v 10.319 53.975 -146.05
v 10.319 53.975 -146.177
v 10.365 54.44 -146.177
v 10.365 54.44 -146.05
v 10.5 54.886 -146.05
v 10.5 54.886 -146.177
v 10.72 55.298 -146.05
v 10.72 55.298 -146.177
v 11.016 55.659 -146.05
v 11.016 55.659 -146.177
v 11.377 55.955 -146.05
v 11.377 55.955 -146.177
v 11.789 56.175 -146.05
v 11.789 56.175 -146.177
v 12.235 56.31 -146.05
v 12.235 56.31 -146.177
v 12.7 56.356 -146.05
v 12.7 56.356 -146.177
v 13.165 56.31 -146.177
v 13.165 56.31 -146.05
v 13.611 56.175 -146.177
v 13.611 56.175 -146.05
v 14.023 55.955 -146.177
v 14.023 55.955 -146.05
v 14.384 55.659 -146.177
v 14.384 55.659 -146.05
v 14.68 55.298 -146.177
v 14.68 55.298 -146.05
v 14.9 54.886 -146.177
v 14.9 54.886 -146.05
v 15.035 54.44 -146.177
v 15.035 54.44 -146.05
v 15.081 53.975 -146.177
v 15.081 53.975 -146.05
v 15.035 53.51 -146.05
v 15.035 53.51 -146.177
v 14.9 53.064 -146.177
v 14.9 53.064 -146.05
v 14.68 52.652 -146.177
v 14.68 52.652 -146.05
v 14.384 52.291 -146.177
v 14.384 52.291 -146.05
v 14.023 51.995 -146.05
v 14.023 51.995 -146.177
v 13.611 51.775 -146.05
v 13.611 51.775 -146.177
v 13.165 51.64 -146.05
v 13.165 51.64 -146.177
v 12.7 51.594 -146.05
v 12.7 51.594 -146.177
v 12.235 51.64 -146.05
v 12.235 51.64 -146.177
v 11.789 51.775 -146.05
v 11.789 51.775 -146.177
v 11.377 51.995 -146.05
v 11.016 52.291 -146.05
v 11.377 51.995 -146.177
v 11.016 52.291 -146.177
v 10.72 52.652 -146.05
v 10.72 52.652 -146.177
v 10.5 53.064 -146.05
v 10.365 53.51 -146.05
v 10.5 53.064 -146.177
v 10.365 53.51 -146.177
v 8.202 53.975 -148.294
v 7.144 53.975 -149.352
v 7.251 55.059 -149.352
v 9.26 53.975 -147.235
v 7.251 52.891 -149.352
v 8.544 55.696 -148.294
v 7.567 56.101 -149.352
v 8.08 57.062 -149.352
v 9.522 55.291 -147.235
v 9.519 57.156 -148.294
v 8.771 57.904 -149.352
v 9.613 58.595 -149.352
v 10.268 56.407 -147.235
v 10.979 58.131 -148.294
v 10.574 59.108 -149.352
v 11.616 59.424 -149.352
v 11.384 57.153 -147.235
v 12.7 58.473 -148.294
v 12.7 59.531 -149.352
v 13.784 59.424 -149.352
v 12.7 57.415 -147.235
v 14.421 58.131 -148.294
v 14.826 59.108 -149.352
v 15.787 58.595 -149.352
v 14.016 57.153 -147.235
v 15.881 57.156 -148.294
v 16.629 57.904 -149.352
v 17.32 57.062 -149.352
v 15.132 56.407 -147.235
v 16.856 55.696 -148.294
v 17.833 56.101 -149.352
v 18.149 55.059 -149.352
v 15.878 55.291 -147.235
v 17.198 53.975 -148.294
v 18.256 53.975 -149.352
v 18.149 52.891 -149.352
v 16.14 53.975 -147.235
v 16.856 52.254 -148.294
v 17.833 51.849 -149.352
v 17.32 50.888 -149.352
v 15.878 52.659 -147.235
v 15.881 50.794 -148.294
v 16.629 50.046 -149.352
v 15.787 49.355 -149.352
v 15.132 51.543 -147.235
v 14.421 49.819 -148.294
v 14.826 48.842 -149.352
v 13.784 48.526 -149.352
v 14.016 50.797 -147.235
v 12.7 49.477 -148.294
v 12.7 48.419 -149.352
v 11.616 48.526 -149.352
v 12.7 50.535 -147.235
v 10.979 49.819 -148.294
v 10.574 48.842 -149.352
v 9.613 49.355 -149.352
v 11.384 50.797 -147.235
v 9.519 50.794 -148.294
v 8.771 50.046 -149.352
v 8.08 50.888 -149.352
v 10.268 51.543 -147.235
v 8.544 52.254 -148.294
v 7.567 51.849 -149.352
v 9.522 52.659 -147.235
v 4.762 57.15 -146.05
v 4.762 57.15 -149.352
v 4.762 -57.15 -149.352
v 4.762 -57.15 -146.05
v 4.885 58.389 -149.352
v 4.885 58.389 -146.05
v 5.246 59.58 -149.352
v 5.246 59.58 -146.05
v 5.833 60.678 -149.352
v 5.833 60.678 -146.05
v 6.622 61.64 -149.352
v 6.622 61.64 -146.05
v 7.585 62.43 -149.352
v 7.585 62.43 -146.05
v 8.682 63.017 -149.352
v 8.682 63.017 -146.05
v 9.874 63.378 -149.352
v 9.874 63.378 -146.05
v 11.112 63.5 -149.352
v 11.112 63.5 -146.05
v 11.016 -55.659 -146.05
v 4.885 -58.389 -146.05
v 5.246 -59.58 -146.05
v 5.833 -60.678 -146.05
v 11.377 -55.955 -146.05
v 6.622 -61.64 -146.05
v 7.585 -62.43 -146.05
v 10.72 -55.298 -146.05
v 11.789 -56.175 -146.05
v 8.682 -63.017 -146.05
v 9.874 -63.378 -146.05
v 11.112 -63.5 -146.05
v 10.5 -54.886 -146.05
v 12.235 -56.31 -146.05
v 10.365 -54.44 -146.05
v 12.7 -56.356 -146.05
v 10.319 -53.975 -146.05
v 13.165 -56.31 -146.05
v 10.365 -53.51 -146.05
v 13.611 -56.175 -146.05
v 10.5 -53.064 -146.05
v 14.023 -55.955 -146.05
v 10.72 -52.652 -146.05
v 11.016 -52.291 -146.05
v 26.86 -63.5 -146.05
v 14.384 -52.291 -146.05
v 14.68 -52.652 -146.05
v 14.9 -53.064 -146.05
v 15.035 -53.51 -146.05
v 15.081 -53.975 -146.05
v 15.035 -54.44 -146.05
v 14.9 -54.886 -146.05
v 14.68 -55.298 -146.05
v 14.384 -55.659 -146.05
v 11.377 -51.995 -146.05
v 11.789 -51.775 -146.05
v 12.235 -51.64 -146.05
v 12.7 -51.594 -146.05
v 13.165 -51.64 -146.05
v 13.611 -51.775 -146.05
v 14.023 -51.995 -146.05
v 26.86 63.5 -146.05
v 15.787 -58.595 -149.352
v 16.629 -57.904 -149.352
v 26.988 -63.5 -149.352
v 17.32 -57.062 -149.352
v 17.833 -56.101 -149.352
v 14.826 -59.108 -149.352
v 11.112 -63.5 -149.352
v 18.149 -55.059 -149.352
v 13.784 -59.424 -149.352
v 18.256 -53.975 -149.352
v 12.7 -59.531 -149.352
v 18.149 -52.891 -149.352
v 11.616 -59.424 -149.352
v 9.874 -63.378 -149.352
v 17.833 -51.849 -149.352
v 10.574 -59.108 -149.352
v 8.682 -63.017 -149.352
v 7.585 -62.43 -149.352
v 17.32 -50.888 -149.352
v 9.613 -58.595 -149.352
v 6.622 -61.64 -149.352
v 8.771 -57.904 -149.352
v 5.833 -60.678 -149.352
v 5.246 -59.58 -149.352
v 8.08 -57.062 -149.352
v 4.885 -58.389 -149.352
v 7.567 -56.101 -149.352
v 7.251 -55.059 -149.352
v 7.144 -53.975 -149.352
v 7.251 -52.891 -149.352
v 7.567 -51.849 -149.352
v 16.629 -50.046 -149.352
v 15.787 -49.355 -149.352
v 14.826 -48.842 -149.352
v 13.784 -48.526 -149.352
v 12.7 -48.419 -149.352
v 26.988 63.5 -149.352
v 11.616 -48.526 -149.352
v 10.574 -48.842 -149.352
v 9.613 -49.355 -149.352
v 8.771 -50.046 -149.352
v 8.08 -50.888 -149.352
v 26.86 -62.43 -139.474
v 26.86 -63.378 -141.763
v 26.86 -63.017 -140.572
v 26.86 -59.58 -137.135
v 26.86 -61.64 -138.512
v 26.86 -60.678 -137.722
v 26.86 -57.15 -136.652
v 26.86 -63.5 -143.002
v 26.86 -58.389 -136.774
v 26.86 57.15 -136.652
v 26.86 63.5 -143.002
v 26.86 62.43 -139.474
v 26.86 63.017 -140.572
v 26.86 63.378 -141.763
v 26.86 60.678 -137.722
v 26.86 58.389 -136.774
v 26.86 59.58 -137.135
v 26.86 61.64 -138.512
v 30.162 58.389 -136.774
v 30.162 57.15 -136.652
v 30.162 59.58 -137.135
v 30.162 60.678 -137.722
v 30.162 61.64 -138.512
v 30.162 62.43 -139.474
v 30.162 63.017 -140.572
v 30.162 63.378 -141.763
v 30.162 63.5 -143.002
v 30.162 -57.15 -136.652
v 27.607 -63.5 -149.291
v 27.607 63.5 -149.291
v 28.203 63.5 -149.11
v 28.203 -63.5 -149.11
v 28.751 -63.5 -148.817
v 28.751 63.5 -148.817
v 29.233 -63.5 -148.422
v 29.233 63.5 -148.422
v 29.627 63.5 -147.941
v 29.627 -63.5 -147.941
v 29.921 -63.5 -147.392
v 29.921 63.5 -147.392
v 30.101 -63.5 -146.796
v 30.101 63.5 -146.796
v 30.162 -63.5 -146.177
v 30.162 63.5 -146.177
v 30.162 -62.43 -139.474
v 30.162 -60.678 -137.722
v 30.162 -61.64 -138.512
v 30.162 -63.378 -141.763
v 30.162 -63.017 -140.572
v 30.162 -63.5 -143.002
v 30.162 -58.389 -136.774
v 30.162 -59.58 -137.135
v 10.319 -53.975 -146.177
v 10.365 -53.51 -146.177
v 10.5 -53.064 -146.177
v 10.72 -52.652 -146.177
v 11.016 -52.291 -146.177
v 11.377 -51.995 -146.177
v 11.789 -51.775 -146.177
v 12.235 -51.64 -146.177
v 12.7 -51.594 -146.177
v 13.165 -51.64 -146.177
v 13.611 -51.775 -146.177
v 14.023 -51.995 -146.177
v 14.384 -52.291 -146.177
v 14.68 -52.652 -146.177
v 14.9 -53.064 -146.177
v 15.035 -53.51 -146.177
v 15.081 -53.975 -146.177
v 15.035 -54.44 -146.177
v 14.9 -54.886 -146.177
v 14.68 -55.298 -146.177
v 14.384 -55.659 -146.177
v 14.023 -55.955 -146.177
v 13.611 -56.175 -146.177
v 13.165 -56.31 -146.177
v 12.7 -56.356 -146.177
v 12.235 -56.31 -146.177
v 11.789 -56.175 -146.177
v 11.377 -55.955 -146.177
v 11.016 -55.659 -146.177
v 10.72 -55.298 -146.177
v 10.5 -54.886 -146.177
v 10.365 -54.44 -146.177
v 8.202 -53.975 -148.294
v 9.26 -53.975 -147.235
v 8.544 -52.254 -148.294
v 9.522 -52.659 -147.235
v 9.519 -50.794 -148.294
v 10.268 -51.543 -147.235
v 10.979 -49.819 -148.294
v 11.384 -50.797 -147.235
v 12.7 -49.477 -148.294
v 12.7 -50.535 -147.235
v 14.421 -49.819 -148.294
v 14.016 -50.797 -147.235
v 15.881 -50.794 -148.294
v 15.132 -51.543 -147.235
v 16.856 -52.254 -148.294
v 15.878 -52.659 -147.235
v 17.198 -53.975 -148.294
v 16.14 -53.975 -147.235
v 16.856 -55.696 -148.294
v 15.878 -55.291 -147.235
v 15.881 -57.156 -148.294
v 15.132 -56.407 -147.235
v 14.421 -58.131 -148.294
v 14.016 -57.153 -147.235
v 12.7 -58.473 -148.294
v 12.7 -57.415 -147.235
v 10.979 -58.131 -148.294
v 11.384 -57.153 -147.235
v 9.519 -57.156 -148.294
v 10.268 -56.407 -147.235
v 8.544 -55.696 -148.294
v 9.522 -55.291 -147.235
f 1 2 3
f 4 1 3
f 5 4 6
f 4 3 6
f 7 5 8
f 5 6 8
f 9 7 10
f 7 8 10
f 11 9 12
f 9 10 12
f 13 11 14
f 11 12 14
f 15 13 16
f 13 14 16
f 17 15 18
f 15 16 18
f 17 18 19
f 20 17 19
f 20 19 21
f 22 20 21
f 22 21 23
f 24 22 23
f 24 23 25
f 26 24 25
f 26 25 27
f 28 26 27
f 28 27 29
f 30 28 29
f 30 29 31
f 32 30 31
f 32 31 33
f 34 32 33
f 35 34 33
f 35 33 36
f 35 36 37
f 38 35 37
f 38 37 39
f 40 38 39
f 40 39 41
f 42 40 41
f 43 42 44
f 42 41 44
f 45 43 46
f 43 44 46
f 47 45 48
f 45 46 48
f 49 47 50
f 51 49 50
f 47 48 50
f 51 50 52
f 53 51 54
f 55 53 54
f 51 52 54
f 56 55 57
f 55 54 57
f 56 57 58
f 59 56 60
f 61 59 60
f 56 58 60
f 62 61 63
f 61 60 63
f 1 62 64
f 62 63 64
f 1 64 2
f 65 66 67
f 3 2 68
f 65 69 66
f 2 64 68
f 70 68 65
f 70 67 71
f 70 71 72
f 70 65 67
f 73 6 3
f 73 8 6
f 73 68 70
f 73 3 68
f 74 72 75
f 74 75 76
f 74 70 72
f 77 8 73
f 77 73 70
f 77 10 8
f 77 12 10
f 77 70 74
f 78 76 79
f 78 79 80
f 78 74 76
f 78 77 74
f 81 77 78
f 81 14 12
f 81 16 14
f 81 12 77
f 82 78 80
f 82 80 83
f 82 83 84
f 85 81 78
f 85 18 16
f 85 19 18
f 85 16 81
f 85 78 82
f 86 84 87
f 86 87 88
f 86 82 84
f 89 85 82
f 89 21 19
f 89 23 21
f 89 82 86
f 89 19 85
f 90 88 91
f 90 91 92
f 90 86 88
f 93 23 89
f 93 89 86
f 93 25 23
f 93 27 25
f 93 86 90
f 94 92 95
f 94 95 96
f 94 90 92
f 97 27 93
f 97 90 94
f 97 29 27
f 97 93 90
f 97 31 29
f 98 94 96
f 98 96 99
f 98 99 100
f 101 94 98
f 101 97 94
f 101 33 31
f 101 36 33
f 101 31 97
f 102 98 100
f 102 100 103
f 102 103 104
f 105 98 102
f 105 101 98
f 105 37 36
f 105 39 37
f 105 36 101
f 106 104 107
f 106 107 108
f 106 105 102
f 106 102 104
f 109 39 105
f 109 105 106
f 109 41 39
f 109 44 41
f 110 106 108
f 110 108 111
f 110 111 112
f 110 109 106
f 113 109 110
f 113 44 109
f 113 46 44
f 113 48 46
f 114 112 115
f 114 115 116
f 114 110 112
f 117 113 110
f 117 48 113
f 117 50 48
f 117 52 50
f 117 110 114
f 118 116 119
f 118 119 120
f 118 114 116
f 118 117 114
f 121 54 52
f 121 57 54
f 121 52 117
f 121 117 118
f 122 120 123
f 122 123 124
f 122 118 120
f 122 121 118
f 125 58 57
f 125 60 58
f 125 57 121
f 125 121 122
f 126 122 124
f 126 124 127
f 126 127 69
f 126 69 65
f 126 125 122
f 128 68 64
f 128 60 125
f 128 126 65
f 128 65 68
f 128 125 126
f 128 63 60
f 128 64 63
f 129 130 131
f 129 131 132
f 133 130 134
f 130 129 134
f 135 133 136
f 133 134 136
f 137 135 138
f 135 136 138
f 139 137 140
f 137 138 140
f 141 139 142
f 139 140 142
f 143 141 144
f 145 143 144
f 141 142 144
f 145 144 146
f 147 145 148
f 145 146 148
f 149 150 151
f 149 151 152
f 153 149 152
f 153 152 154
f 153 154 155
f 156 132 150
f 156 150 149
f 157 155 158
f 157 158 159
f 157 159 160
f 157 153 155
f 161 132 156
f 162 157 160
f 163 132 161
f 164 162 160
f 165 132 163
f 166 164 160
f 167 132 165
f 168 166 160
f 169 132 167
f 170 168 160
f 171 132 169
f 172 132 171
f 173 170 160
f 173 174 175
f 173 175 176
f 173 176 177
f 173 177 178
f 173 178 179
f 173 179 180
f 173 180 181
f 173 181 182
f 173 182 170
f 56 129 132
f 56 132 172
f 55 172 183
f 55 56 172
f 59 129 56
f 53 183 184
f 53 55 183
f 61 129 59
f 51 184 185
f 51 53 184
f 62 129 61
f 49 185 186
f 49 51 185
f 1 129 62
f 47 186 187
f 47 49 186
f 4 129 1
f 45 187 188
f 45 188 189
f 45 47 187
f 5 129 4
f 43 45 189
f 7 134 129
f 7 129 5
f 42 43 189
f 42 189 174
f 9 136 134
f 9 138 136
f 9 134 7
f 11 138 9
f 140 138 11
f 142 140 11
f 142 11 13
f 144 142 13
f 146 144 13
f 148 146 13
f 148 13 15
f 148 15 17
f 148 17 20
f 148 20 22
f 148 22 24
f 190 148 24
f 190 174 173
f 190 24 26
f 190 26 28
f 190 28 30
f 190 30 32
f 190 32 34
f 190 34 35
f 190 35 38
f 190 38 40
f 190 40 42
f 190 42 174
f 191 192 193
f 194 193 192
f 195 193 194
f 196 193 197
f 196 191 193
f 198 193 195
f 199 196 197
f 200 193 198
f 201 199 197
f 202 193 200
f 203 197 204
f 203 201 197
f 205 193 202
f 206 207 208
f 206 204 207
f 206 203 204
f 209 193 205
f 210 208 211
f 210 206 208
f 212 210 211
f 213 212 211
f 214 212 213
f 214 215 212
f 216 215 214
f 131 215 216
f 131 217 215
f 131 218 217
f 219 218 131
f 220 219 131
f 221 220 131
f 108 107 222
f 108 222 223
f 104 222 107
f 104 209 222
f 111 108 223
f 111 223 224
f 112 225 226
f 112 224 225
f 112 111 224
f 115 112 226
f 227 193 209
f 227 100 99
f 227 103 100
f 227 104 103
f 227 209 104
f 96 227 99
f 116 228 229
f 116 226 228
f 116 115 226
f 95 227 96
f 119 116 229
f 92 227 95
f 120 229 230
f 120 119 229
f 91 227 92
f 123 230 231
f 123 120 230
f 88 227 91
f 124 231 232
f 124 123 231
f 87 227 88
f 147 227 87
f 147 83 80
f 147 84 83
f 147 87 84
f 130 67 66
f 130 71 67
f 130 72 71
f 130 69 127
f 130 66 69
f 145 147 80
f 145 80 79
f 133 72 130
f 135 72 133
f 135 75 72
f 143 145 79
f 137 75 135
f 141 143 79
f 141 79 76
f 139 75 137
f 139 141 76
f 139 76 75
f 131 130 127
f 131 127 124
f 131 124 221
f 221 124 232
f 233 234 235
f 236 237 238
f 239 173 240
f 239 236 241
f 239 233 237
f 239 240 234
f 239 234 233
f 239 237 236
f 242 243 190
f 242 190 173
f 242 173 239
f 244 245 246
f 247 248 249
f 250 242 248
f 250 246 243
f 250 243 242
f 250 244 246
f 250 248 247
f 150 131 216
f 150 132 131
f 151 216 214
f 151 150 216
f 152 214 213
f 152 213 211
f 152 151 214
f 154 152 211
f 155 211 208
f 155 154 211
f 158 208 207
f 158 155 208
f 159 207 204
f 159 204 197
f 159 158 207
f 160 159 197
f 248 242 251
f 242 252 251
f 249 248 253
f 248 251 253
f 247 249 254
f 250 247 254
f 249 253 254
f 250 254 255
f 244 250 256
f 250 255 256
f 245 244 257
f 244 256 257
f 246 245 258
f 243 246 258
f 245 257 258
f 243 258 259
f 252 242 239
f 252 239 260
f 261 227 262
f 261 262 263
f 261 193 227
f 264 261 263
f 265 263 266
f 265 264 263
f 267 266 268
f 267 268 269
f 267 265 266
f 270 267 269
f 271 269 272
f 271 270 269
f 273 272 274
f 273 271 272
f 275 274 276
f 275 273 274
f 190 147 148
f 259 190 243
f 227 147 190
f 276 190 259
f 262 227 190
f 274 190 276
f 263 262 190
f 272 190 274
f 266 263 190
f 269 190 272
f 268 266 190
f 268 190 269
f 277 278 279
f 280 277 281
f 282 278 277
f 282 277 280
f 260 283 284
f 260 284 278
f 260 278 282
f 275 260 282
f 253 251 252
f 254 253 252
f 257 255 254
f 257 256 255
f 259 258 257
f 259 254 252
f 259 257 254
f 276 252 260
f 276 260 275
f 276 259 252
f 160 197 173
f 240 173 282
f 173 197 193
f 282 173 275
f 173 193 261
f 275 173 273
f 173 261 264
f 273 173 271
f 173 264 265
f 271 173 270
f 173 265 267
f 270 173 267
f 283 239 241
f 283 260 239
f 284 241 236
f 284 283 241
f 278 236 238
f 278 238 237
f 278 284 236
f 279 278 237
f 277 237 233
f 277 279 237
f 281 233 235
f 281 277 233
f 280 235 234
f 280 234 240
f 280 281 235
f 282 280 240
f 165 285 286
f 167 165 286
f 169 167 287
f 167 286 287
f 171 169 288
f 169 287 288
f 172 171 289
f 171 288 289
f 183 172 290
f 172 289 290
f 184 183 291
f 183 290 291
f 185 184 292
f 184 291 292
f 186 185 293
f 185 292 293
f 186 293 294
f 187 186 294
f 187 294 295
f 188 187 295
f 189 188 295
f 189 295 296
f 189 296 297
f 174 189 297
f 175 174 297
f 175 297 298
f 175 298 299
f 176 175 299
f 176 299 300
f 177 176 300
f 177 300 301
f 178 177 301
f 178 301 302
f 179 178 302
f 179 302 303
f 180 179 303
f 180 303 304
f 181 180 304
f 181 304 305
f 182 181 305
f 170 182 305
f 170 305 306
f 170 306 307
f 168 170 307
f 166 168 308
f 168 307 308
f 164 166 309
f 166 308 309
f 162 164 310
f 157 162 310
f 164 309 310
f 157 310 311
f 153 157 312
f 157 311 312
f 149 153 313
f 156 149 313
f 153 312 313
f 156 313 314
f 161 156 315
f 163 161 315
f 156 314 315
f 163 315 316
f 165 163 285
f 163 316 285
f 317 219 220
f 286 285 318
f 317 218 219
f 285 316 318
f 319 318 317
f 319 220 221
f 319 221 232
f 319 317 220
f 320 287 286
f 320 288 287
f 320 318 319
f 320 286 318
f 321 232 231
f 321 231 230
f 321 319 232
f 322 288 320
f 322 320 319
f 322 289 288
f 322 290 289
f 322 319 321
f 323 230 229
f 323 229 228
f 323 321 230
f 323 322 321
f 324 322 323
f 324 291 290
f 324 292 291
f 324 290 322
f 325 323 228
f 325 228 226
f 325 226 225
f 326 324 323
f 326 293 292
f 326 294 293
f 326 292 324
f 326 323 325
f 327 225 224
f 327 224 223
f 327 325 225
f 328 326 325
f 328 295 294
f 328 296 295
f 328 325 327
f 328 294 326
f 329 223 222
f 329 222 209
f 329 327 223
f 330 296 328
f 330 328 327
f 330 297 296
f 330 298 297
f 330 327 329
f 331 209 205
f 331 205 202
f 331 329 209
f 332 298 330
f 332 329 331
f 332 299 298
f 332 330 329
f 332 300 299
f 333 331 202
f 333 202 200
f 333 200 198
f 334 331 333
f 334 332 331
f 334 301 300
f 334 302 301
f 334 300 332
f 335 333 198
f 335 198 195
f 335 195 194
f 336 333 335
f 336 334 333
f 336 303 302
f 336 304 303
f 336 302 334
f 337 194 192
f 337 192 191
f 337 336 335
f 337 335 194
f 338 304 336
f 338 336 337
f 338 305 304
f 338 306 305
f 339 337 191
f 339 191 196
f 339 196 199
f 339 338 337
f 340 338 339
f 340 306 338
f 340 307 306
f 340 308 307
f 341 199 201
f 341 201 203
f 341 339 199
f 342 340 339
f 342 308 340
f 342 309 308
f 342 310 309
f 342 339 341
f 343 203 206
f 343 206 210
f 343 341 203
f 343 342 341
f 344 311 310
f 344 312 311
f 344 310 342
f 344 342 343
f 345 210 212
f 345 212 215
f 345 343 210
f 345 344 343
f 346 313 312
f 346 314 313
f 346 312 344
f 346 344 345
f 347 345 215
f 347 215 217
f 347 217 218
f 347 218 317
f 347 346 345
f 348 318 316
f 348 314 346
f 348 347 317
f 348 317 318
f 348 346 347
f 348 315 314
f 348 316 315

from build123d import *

# Parameters (mm, degrees)
PAD6703_DEPTH            = 63.5
FILLET540_R              = 6.35
FILLET541_R              = 3.175
SKETCH7626_R             = 2.38125
POCKET658_DEPTH          = 12.701
CHAMFER2378_SIZE         = 3.175
BODY6012_PLACEMENT_ANGLE = 180


with BuildPart() as part:
    # Sketch7640 → Pad6703 (new body, symmetric)
    with BuildSketch(Plane.XZ):
        Polygon((0, 0), (22.098, 0), (22.098, -9.398), (25.4, -9.398), (25.4, 3.302), (0, 3.302), align=None)
    extrude(amount=PAD6703_DEPTH, both=True)

    # Fillet540
    fillet540_edges = [part.edges().sort_by_distance(p)[0] for p in [
        (23.749, -63.5, -9.398),
        (23.749, 63.5, -9.398),
        (0, 63.5, 1.651),
        (0, -63.5, 1.651),
    ]]
    fillet(fillet540_edges, radius=FILLET540_R)

    # Fillet541
    fillet541_edges = [part.edges().sort_by_distance(p)[0] for p in [
        (25.4, 0, 3.302),
    ]]
    fillet(fillet541_edges, radius=FILLET541_R)

    # Sketch7626 (on ShapeBinder) → Pocket658 (cut, through all)
    with BuildSketch(Plane(origin=(0, 0, 3.302), x_dir=(-1, 0, 0), z_dir=(0, 0, 1))):
        with Locations((-7.9375, 53.975)):
            Circle(SKETCH7626_R)
        with Locations((-7.9375, -53.975)):
            Circle(SKETCH7626_R)
    extrude(amount=-POCKET658_DEPTH, mode=Mode.SUBTRACT)

    # Chamfer2378
    chamfer2378_edges = [part.edges().sort_by_distance(p)[0] for p in [
        (10.31875, 53.975, 3.302),
        (10.31875, -53.975, 3.302),
    ]]
    chamfer(chamfer2378_edges, length=CHAMFER2378_SIZE)


with BuildPart() as part_1:
    # Body6007 placement: moved
    add(part.part.moved(Location((4.7625, 0, 146.05))))


with BuildPart() as part_2:
    # Clone377 placement: moved
    add(part_1.part.moved(Location((0, -19.05, -142.875))))


with BuildPart() as part_3:
    # Body6012 placement: moved
    add(part_2.part.moved(Location((0, -19.05, -142.875))).rotate(Axis((0, -19.05, -142.875), (1, 0, 0)), BODY6012_PLACEMENT_ANGLE))


solid = part_3.part
